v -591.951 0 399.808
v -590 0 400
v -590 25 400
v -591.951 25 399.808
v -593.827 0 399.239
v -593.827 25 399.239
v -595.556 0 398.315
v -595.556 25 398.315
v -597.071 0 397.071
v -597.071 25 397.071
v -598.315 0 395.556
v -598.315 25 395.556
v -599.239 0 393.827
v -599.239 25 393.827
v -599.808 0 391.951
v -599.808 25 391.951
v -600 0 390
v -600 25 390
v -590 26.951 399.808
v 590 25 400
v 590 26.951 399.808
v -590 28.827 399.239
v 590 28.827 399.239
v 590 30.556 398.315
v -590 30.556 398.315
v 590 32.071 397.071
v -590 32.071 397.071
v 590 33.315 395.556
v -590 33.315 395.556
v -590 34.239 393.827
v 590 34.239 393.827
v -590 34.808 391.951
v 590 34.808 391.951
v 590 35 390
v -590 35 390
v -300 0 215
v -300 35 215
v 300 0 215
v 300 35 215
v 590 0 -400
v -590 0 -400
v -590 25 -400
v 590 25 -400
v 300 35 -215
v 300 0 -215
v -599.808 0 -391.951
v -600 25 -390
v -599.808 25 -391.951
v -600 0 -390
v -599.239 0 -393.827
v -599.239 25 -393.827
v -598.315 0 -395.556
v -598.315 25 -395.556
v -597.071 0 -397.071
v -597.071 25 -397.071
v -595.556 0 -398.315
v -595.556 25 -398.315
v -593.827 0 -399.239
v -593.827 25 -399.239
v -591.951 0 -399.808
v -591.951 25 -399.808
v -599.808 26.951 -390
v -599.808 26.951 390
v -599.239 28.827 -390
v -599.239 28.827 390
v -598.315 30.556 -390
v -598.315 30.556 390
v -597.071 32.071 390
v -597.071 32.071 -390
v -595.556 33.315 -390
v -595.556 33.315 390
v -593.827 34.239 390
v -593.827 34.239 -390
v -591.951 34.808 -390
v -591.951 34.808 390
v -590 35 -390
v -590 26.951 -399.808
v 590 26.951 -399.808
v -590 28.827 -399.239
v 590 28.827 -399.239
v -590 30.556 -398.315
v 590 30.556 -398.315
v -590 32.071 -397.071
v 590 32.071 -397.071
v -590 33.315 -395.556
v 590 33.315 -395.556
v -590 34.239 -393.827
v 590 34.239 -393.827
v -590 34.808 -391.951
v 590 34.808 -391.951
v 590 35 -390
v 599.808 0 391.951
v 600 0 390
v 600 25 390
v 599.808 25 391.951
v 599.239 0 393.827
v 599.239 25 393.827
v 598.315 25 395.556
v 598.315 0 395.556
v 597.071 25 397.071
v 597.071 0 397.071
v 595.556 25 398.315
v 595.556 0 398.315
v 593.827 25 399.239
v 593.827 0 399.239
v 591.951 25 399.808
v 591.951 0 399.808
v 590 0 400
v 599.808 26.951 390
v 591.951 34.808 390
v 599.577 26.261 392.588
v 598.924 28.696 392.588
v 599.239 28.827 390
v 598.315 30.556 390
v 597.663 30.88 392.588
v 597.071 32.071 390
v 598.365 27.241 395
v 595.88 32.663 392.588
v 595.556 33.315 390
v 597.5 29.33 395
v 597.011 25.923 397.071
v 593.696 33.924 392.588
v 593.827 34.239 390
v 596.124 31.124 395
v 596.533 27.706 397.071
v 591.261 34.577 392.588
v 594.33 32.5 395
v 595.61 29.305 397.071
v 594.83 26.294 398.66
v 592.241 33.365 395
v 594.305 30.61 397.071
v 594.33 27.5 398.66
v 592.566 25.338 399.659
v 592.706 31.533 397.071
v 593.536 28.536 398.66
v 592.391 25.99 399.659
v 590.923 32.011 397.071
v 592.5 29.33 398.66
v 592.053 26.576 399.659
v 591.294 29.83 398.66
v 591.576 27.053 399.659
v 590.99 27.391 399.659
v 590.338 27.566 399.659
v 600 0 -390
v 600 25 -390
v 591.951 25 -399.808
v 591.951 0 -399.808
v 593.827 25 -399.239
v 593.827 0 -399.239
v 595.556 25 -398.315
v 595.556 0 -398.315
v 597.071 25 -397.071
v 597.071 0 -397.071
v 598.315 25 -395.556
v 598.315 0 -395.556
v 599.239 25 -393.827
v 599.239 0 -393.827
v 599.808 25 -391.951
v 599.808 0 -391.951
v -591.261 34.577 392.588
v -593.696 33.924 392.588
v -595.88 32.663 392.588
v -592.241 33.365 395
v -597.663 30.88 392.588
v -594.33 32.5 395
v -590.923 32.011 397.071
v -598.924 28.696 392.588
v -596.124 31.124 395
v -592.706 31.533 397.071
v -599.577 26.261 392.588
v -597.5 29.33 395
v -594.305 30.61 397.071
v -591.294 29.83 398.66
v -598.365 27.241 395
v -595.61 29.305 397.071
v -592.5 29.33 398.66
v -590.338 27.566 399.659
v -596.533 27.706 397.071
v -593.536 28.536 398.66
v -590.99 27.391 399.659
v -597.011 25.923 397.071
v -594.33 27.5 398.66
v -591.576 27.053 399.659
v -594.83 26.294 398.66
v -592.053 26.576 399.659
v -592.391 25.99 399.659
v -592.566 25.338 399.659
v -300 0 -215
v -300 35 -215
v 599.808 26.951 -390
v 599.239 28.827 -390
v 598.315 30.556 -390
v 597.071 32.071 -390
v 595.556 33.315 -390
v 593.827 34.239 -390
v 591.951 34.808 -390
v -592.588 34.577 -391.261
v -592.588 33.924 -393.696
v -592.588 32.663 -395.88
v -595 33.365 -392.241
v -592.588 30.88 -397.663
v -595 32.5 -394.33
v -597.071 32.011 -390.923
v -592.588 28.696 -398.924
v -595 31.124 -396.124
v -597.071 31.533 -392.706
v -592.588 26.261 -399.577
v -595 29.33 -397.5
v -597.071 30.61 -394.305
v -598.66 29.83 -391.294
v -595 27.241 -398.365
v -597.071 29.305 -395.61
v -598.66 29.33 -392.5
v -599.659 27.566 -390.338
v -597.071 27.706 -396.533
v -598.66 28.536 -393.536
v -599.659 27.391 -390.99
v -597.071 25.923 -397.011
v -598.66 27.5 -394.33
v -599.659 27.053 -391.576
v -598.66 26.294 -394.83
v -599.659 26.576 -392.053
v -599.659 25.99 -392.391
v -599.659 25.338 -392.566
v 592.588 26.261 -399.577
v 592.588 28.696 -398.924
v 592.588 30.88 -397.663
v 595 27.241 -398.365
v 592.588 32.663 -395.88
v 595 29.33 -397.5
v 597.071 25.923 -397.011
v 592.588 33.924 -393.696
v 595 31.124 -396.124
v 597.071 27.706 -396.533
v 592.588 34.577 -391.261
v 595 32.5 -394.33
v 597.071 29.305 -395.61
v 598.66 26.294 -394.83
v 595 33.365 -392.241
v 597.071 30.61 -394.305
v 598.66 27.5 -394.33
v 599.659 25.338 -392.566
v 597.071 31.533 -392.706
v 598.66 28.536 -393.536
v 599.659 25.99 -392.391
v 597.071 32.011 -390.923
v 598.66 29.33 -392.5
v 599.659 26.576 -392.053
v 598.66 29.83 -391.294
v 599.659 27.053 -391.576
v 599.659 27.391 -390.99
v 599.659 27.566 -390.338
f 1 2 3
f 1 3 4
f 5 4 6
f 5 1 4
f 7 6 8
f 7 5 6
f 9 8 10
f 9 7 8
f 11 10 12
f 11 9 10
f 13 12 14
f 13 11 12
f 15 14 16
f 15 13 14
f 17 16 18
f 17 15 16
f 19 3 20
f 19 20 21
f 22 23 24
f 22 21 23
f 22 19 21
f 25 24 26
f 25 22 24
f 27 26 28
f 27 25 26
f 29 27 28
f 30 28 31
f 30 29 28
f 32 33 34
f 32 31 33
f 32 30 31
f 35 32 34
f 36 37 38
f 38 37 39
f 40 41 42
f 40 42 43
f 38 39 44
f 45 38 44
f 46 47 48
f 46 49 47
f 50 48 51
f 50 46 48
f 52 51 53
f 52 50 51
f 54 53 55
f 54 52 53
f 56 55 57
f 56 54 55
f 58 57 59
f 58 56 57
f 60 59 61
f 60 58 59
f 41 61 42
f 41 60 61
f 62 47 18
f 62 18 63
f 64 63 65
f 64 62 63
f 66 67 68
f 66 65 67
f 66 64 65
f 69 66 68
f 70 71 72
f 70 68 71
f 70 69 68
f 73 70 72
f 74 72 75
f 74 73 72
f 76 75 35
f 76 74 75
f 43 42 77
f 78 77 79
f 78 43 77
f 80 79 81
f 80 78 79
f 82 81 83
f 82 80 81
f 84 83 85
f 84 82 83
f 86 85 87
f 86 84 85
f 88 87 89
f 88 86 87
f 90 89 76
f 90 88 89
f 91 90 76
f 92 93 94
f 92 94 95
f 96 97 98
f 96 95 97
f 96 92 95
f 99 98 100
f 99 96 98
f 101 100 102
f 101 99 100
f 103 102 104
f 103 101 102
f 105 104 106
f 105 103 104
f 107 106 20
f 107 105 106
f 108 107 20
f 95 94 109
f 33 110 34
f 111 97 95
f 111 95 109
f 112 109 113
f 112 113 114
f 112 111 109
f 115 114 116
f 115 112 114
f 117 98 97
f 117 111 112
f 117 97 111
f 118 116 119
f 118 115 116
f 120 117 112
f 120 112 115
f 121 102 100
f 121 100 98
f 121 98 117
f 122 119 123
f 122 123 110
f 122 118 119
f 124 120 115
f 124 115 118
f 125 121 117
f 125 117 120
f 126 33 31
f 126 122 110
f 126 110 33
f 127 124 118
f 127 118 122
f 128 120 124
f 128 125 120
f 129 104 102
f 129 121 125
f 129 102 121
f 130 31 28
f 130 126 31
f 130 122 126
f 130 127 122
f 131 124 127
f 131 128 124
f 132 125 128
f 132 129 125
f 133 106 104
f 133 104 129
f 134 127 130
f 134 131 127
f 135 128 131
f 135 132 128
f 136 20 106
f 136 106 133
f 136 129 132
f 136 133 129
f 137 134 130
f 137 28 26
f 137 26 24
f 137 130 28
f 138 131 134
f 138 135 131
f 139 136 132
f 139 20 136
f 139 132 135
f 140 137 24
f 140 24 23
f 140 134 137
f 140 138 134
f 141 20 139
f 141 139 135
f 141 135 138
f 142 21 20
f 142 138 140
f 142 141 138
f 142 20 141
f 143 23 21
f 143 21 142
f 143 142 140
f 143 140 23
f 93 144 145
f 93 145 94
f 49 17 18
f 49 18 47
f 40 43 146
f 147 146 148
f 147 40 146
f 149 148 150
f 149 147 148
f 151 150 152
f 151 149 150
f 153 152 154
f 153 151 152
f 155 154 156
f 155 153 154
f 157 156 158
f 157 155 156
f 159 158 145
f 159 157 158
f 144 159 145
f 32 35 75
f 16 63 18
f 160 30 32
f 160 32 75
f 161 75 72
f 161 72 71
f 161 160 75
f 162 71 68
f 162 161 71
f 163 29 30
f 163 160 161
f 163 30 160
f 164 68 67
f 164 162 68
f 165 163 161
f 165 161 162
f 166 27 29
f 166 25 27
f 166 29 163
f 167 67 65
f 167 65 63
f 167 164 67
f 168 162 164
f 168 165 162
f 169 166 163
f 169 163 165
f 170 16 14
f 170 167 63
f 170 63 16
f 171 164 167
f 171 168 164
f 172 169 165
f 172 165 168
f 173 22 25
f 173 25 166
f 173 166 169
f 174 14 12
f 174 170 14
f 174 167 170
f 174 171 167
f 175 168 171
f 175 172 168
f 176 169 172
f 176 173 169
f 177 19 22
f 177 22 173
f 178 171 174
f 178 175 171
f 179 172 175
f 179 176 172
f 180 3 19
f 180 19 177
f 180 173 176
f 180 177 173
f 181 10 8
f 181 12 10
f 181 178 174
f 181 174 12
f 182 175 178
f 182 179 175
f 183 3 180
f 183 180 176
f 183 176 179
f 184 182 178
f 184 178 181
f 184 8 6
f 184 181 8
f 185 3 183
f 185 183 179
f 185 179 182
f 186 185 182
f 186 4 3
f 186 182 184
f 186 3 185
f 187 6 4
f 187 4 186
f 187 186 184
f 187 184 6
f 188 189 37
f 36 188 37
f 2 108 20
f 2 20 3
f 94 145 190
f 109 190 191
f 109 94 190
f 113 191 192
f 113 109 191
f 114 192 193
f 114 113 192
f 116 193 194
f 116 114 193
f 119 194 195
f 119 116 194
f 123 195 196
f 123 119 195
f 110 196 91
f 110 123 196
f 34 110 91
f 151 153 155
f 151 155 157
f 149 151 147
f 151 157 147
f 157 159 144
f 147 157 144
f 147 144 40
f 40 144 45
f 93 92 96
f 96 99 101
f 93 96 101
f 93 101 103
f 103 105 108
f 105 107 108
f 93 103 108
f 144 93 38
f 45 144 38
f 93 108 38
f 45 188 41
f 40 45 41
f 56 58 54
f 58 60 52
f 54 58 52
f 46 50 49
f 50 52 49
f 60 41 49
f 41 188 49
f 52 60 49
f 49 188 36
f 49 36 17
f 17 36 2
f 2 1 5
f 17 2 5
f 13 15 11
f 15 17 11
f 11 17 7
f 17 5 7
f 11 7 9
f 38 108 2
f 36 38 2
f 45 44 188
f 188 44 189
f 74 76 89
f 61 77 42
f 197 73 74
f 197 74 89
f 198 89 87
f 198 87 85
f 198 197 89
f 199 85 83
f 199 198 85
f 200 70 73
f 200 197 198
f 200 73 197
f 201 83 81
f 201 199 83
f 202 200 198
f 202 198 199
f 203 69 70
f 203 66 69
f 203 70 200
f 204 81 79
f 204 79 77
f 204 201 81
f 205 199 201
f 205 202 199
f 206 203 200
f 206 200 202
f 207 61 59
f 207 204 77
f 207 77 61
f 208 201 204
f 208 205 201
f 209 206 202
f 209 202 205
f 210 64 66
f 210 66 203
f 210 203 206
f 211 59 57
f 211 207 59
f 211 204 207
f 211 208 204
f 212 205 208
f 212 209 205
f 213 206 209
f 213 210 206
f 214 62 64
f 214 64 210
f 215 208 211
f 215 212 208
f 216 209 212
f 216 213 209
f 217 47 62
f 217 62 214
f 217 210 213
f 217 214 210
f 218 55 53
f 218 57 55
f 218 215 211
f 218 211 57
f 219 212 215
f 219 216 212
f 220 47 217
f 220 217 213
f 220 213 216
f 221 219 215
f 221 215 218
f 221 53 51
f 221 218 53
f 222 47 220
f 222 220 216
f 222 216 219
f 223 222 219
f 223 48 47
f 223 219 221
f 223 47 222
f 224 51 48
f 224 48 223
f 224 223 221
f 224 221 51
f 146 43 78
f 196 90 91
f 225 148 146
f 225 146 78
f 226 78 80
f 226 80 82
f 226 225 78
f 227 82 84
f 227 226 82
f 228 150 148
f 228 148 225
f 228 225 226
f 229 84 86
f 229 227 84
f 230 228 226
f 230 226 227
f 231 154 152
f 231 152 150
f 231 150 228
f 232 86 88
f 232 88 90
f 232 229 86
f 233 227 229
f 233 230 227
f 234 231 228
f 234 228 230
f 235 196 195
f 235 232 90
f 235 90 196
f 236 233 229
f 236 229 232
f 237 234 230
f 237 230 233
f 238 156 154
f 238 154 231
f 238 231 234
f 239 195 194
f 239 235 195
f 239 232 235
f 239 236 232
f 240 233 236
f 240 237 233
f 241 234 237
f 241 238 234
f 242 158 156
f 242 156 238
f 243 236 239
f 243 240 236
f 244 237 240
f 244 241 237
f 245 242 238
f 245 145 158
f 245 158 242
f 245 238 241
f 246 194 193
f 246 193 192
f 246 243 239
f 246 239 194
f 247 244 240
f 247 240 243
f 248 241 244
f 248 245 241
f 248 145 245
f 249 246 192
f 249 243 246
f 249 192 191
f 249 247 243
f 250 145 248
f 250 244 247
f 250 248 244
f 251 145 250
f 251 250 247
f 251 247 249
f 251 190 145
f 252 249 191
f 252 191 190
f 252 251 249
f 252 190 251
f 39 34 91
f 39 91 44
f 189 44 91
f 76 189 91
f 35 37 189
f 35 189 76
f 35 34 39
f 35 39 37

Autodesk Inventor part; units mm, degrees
ref_plane "YZ Plane" through (0, 0, 0) normal (1, 0, 0) x (0, 1, 0)
ref_plane "XZ Plane" through (0, 0, 0) normal (0, 1, 0) x (-1, 0, 0)
ref_plane "XY Plane" through (0, 0, 0) normal (0, 0, 1) x (1, 0, 0)
sketch "Sketch1" plane through (0, 0, 0) normal (0, 1, 0) x (-1, 0, 0)
  line L0 (-600, 400) -> (600, 400)
  line L1 (600, 400) -> (600, -400)
  line L2 (600, -400) -> (-600, -400)
  line L3 (-600, -400) -> (-600, 400)
  line L4 (-600, 400) -> (600, -400) construction
  line L5 (600, 400) -> (-600, -400) construction
  point P0 (0, 0)
  dimension "d0" = 1200
  dimension "d1" = 800
extrude "Extrusion1" add sketch "Sketch1" along normal blind 35
sketch "Sketch2" plane through (0, 35, 0) normal (0, 1, 0) x (1, 0, 0)
  line L0 (-300, -215) -> (300, -215)
  line L1 (300, -215) -> (300, 215)
  line L2 (300, 215) -> (-300, 215)
  line L3 (-300, 215) -> (-300, -215)
  line L4 (-300, -215) -> (300, 215) construction
  line L5 (300, -215) -> (-300, 215) construction
  point P0 (0, 0)
  dimension "d8" = 430
  dimension "d9" = 600
extrude "Extrusion2" cut sketch "Sketch2" against normal blind 35
fillet "Fillet2" radius 10 4 edges at (0, 35, 400) (-600, 35, 0) (0, 35, -400) (600, 35, 0)
fillet "Fillet3" radius 10 8 edges at (597.0711, 32.0711, 397.0711) (600, 12.5, 400) (597.0711, 32.0711, -397.0711) (600, 12.5, -400) (-597.0711, 32.0711, 397.0711) (-600, 12.5, 400) (-597.0711, 32.0711, -397.0711) (-600, 12.5, -400)
properties part number "señales_tapa_x10"
